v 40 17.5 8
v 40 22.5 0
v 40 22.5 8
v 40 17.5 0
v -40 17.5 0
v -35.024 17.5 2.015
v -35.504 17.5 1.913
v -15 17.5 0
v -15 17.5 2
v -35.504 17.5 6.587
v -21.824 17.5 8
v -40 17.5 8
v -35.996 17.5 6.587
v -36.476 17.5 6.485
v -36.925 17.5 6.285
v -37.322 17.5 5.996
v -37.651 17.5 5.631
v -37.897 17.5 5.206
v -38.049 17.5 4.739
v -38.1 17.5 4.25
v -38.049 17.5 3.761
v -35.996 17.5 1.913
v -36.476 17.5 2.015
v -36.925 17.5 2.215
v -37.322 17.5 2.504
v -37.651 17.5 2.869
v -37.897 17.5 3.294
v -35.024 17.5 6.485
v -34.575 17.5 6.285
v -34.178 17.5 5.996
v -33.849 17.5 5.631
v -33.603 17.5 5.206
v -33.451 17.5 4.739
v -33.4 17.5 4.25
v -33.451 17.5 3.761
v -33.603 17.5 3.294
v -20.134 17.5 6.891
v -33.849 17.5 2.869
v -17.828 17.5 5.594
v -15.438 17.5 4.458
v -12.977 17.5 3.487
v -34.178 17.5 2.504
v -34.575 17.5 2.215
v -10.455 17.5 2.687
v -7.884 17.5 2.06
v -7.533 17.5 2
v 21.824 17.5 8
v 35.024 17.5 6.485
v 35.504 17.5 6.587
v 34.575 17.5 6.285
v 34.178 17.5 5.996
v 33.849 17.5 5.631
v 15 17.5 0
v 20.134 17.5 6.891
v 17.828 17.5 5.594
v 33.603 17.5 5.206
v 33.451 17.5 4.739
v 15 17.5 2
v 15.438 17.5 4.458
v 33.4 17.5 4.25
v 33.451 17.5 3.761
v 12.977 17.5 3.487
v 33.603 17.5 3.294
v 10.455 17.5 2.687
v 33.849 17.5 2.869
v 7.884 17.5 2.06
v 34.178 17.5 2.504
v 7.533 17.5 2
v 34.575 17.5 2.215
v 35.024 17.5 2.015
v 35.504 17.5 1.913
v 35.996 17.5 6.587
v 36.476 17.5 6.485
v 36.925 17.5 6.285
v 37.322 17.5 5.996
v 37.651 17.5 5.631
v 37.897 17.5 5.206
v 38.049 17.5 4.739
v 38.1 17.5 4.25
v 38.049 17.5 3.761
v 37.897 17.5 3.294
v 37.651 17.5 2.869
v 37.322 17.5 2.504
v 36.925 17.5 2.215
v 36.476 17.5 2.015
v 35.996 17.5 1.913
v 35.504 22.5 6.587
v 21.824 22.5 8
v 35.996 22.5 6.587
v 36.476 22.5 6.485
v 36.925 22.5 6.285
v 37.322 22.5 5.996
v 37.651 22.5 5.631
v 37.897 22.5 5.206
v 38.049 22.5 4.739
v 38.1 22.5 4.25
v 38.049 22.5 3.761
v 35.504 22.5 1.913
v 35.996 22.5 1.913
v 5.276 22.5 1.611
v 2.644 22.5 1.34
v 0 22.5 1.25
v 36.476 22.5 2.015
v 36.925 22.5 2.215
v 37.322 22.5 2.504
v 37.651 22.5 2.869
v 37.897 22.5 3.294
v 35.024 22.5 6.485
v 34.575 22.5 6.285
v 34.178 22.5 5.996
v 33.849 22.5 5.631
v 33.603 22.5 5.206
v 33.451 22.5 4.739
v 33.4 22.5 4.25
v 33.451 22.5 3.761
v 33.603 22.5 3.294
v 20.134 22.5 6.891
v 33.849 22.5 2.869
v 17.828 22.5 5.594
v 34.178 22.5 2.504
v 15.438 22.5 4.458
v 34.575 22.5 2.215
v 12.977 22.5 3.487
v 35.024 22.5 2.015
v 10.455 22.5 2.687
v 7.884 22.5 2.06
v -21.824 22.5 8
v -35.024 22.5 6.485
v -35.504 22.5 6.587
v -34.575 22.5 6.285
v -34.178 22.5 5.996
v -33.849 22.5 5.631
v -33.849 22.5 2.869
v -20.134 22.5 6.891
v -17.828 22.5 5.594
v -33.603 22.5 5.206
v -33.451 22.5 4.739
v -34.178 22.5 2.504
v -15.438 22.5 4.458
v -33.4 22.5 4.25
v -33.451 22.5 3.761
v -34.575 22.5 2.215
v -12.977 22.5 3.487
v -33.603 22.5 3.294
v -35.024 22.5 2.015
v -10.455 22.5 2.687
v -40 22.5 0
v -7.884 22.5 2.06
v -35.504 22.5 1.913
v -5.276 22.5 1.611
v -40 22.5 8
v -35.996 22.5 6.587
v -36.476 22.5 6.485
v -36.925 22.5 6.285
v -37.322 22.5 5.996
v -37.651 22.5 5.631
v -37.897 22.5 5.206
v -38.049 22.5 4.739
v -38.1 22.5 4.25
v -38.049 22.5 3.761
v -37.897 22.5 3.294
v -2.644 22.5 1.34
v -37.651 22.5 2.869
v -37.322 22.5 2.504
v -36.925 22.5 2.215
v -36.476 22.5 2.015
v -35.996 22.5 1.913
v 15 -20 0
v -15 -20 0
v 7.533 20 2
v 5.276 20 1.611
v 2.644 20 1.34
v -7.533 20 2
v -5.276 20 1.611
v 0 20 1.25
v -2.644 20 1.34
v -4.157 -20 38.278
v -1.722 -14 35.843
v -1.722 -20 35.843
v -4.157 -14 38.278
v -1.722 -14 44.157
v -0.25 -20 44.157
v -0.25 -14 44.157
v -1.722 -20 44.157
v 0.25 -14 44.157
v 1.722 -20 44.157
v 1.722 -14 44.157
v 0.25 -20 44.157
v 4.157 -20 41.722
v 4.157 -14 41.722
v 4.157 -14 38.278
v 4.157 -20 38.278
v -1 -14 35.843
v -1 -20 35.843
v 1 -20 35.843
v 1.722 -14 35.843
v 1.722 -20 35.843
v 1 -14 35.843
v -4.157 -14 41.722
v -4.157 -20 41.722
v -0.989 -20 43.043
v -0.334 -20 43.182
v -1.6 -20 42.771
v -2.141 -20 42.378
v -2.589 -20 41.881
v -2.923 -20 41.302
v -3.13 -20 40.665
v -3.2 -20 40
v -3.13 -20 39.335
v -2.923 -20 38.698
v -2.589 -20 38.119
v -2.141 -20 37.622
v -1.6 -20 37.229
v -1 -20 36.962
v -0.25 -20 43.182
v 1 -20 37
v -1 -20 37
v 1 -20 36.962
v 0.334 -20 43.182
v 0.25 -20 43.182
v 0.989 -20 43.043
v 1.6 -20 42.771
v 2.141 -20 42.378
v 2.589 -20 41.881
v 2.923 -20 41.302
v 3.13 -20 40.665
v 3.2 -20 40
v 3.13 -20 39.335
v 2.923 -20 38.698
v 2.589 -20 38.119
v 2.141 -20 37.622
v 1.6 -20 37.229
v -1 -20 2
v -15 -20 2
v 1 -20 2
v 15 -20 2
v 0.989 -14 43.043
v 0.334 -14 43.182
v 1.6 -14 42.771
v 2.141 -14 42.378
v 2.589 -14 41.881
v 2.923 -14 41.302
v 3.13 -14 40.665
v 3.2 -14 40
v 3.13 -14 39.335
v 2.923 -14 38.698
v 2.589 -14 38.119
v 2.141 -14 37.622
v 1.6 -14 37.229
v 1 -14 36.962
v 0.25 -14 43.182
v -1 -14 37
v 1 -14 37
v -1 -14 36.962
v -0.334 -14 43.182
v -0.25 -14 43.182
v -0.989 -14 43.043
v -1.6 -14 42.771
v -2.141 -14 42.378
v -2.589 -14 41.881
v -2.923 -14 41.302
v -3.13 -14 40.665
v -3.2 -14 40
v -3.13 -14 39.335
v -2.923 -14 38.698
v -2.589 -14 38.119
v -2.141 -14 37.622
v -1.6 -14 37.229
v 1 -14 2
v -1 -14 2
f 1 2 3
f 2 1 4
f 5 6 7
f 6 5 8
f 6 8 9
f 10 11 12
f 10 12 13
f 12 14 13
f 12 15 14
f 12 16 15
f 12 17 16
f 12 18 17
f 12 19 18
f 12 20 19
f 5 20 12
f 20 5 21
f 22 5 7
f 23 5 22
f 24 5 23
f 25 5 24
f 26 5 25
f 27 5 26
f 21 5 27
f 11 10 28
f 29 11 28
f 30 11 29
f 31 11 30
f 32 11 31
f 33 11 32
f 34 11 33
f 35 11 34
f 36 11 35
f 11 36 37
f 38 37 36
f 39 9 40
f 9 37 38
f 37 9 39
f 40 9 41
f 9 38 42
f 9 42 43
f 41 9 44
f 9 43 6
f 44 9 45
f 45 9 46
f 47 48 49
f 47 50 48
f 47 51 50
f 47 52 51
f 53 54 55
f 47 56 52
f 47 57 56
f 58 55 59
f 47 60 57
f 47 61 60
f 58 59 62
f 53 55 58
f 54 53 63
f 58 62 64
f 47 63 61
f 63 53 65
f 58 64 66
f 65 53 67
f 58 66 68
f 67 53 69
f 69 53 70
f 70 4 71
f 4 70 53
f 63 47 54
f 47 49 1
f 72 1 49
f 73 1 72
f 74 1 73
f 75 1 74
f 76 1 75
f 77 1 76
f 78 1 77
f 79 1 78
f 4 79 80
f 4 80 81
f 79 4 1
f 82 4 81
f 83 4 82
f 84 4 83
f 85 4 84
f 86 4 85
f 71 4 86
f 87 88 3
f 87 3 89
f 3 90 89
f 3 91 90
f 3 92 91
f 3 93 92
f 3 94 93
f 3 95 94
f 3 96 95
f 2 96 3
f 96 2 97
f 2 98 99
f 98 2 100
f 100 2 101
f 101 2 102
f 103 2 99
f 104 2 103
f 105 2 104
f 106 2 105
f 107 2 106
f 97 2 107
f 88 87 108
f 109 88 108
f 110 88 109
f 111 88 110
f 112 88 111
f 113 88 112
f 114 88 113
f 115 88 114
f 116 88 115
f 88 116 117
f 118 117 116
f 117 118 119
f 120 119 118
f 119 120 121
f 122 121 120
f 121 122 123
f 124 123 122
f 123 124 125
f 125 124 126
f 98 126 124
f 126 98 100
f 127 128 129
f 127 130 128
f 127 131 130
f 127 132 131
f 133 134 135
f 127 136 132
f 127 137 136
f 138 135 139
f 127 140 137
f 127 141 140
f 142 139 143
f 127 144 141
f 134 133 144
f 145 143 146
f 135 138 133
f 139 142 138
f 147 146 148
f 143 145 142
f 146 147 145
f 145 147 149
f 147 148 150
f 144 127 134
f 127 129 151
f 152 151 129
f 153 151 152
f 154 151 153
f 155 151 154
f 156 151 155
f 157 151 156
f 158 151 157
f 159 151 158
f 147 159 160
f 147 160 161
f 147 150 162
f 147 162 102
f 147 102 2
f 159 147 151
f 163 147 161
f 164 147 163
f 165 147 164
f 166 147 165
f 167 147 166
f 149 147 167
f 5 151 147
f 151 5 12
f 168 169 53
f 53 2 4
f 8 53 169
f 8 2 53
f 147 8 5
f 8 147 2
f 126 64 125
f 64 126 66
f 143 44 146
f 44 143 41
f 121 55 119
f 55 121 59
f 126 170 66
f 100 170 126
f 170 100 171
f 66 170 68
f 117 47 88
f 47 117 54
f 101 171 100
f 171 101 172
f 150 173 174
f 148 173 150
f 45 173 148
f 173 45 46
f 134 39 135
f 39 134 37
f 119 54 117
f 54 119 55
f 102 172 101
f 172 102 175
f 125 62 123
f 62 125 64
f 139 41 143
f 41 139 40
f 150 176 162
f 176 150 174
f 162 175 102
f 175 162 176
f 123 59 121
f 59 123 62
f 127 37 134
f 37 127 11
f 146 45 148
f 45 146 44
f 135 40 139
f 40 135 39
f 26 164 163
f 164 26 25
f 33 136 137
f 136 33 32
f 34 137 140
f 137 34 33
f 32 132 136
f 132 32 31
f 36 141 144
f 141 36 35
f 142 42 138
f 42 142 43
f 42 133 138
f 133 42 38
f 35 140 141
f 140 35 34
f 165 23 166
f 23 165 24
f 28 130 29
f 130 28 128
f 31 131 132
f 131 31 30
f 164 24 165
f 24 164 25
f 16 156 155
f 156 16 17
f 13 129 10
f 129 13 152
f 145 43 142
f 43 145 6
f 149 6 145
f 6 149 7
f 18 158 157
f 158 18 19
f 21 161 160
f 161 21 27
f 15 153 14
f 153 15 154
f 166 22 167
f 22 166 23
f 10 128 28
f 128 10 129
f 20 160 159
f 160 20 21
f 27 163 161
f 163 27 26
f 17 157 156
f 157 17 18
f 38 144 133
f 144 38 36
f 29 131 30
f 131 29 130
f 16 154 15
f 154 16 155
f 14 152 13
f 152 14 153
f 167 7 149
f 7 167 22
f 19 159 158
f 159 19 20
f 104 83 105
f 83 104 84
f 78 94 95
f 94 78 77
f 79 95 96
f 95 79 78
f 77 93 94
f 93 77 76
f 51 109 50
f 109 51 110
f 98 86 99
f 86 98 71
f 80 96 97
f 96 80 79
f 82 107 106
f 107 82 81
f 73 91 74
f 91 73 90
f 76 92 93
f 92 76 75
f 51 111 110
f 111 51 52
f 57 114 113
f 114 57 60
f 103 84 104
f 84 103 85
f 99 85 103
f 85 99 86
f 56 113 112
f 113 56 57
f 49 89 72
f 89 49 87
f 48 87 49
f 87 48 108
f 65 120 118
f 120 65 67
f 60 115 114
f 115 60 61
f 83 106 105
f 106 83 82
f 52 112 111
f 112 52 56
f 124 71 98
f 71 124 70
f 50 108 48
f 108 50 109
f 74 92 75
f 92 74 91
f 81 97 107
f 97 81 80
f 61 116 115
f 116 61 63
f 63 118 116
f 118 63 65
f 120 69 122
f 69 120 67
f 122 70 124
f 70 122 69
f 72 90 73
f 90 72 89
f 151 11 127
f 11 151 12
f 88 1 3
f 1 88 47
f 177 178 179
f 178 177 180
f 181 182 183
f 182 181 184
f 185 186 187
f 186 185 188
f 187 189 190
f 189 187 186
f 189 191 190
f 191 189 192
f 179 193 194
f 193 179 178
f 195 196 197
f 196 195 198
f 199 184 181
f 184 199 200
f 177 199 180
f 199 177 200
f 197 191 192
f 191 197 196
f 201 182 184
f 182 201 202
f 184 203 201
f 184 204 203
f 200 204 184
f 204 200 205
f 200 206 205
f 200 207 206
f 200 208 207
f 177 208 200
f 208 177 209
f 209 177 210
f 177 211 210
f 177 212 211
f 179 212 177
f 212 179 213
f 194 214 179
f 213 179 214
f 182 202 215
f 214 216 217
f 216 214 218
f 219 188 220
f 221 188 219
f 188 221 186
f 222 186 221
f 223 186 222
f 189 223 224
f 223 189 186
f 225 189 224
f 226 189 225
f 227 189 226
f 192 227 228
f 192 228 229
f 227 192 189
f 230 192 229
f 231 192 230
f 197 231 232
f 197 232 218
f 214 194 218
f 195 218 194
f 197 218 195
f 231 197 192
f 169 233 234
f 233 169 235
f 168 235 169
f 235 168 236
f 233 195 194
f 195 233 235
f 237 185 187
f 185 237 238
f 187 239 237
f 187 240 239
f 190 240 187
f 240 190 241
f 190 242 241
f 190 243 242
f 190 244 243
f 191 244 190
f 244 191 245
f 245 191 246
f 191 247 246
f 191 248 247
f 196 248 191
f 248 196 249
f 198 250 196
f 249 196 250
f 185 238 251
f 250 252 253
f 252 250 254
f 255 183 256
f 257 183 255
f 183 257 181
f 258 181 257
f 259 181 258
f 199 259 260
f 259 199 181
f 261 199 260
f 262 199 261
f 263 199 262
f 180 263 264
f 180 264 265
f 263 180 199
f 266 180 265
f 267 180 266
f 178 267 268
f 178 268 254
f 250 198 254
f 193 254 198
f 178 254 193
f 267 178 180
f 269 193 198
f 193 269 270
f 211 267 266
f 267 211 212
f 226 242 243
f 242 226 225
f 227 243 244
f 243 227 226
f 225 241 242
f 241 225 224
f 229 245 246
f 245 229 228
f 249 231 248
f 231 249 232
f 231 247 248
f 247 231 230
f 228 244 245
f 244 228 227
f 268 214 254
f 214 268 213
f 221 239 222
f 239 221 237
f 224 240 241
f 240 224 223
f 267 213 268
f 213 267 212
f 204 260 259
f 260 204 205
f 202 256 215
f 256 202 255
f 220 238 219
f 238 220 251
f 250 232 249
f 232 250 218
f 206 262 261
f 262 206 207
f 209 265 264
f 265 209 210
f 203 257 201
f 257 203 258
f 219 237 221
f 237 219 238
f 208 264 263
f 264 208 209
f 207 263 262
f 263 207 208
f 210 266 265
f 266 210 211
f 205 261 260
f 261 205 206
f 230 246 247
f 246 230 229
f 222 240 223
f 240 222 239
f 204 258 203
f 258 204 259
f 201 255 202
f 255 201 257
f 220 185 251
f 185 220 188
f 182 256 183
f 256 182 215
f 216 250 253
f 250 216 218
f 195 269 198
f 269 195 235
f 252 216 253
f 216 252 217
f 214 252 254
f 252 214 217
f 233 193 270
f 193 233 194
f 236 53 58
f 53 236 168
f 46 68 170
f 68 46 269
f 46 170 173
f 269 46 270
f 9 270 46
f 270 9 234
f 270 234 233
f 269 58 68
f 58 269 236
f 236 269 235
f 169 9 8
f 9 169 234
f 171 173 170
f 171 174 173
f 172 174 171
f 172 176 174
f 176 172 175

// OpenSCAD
// Laser Tunnel -- Fan/Laser bracket
// Adrian McCarthy 2022

module fan_laser_bracket(thickness=3, nozzle_d=0.4) {
    // Plate that mounts to a standard 80mm PC case cooling fan
    module fan_plate(thickness) {
        difference() {
            cube([80, 80, thickness], center=true);
            
            // Cutout for air flow
            cylinder(h=thickness+2, d=77.5, center=true, $fn=92);

            // Holes for mounting screws
            offset = 71.5/2;
            h = thickness + 2;
            translate([-offset, -offset, 0]) cylinder(h=h, d=4.7, center=true);
            translate([ offset, -offset, 0]) cylinder(h=h, d=4.7, center=true);
            translate([-offset,  offset, 0]) cylinder(h=h, d=4.7, center=true);
            translate([ offset,  offset, 0]) cylinder(h=h, d=4.7, center=true);
        }
    }

    translate([0, 20, 0]) intersection() {
        translate([0, 0, 40]) rotate([90, 0, 0]) fan_plate(thickness=5, $fs=nozzle_d/2);
        cube([80, 5, 16], center=true);
    }
    translate([0, 0, thickness/2]) cube([30, 40, thickness], center=true);
    translate([0, -17, 0]) {
        translate([0, 0, 40]) {
            rotate([90, 0, 0]) difference() {
                rotate([0, 0, 45/2]) cylinder(h=6, d=9, center=true, $fn=8);
                cylinder(h=9, d=6+nozzle_d, center=true, $fs=nozzle_d/2);
                translate([0, 3, 0]) cube([0.5, 6, 8], center=true);
            }
        }
        translate([0, 0, (40-6/2)/2]) cube([thickness, 6, 40-6/2], center=true);
    }
}


fan_laser_bracket(thickness=2);
